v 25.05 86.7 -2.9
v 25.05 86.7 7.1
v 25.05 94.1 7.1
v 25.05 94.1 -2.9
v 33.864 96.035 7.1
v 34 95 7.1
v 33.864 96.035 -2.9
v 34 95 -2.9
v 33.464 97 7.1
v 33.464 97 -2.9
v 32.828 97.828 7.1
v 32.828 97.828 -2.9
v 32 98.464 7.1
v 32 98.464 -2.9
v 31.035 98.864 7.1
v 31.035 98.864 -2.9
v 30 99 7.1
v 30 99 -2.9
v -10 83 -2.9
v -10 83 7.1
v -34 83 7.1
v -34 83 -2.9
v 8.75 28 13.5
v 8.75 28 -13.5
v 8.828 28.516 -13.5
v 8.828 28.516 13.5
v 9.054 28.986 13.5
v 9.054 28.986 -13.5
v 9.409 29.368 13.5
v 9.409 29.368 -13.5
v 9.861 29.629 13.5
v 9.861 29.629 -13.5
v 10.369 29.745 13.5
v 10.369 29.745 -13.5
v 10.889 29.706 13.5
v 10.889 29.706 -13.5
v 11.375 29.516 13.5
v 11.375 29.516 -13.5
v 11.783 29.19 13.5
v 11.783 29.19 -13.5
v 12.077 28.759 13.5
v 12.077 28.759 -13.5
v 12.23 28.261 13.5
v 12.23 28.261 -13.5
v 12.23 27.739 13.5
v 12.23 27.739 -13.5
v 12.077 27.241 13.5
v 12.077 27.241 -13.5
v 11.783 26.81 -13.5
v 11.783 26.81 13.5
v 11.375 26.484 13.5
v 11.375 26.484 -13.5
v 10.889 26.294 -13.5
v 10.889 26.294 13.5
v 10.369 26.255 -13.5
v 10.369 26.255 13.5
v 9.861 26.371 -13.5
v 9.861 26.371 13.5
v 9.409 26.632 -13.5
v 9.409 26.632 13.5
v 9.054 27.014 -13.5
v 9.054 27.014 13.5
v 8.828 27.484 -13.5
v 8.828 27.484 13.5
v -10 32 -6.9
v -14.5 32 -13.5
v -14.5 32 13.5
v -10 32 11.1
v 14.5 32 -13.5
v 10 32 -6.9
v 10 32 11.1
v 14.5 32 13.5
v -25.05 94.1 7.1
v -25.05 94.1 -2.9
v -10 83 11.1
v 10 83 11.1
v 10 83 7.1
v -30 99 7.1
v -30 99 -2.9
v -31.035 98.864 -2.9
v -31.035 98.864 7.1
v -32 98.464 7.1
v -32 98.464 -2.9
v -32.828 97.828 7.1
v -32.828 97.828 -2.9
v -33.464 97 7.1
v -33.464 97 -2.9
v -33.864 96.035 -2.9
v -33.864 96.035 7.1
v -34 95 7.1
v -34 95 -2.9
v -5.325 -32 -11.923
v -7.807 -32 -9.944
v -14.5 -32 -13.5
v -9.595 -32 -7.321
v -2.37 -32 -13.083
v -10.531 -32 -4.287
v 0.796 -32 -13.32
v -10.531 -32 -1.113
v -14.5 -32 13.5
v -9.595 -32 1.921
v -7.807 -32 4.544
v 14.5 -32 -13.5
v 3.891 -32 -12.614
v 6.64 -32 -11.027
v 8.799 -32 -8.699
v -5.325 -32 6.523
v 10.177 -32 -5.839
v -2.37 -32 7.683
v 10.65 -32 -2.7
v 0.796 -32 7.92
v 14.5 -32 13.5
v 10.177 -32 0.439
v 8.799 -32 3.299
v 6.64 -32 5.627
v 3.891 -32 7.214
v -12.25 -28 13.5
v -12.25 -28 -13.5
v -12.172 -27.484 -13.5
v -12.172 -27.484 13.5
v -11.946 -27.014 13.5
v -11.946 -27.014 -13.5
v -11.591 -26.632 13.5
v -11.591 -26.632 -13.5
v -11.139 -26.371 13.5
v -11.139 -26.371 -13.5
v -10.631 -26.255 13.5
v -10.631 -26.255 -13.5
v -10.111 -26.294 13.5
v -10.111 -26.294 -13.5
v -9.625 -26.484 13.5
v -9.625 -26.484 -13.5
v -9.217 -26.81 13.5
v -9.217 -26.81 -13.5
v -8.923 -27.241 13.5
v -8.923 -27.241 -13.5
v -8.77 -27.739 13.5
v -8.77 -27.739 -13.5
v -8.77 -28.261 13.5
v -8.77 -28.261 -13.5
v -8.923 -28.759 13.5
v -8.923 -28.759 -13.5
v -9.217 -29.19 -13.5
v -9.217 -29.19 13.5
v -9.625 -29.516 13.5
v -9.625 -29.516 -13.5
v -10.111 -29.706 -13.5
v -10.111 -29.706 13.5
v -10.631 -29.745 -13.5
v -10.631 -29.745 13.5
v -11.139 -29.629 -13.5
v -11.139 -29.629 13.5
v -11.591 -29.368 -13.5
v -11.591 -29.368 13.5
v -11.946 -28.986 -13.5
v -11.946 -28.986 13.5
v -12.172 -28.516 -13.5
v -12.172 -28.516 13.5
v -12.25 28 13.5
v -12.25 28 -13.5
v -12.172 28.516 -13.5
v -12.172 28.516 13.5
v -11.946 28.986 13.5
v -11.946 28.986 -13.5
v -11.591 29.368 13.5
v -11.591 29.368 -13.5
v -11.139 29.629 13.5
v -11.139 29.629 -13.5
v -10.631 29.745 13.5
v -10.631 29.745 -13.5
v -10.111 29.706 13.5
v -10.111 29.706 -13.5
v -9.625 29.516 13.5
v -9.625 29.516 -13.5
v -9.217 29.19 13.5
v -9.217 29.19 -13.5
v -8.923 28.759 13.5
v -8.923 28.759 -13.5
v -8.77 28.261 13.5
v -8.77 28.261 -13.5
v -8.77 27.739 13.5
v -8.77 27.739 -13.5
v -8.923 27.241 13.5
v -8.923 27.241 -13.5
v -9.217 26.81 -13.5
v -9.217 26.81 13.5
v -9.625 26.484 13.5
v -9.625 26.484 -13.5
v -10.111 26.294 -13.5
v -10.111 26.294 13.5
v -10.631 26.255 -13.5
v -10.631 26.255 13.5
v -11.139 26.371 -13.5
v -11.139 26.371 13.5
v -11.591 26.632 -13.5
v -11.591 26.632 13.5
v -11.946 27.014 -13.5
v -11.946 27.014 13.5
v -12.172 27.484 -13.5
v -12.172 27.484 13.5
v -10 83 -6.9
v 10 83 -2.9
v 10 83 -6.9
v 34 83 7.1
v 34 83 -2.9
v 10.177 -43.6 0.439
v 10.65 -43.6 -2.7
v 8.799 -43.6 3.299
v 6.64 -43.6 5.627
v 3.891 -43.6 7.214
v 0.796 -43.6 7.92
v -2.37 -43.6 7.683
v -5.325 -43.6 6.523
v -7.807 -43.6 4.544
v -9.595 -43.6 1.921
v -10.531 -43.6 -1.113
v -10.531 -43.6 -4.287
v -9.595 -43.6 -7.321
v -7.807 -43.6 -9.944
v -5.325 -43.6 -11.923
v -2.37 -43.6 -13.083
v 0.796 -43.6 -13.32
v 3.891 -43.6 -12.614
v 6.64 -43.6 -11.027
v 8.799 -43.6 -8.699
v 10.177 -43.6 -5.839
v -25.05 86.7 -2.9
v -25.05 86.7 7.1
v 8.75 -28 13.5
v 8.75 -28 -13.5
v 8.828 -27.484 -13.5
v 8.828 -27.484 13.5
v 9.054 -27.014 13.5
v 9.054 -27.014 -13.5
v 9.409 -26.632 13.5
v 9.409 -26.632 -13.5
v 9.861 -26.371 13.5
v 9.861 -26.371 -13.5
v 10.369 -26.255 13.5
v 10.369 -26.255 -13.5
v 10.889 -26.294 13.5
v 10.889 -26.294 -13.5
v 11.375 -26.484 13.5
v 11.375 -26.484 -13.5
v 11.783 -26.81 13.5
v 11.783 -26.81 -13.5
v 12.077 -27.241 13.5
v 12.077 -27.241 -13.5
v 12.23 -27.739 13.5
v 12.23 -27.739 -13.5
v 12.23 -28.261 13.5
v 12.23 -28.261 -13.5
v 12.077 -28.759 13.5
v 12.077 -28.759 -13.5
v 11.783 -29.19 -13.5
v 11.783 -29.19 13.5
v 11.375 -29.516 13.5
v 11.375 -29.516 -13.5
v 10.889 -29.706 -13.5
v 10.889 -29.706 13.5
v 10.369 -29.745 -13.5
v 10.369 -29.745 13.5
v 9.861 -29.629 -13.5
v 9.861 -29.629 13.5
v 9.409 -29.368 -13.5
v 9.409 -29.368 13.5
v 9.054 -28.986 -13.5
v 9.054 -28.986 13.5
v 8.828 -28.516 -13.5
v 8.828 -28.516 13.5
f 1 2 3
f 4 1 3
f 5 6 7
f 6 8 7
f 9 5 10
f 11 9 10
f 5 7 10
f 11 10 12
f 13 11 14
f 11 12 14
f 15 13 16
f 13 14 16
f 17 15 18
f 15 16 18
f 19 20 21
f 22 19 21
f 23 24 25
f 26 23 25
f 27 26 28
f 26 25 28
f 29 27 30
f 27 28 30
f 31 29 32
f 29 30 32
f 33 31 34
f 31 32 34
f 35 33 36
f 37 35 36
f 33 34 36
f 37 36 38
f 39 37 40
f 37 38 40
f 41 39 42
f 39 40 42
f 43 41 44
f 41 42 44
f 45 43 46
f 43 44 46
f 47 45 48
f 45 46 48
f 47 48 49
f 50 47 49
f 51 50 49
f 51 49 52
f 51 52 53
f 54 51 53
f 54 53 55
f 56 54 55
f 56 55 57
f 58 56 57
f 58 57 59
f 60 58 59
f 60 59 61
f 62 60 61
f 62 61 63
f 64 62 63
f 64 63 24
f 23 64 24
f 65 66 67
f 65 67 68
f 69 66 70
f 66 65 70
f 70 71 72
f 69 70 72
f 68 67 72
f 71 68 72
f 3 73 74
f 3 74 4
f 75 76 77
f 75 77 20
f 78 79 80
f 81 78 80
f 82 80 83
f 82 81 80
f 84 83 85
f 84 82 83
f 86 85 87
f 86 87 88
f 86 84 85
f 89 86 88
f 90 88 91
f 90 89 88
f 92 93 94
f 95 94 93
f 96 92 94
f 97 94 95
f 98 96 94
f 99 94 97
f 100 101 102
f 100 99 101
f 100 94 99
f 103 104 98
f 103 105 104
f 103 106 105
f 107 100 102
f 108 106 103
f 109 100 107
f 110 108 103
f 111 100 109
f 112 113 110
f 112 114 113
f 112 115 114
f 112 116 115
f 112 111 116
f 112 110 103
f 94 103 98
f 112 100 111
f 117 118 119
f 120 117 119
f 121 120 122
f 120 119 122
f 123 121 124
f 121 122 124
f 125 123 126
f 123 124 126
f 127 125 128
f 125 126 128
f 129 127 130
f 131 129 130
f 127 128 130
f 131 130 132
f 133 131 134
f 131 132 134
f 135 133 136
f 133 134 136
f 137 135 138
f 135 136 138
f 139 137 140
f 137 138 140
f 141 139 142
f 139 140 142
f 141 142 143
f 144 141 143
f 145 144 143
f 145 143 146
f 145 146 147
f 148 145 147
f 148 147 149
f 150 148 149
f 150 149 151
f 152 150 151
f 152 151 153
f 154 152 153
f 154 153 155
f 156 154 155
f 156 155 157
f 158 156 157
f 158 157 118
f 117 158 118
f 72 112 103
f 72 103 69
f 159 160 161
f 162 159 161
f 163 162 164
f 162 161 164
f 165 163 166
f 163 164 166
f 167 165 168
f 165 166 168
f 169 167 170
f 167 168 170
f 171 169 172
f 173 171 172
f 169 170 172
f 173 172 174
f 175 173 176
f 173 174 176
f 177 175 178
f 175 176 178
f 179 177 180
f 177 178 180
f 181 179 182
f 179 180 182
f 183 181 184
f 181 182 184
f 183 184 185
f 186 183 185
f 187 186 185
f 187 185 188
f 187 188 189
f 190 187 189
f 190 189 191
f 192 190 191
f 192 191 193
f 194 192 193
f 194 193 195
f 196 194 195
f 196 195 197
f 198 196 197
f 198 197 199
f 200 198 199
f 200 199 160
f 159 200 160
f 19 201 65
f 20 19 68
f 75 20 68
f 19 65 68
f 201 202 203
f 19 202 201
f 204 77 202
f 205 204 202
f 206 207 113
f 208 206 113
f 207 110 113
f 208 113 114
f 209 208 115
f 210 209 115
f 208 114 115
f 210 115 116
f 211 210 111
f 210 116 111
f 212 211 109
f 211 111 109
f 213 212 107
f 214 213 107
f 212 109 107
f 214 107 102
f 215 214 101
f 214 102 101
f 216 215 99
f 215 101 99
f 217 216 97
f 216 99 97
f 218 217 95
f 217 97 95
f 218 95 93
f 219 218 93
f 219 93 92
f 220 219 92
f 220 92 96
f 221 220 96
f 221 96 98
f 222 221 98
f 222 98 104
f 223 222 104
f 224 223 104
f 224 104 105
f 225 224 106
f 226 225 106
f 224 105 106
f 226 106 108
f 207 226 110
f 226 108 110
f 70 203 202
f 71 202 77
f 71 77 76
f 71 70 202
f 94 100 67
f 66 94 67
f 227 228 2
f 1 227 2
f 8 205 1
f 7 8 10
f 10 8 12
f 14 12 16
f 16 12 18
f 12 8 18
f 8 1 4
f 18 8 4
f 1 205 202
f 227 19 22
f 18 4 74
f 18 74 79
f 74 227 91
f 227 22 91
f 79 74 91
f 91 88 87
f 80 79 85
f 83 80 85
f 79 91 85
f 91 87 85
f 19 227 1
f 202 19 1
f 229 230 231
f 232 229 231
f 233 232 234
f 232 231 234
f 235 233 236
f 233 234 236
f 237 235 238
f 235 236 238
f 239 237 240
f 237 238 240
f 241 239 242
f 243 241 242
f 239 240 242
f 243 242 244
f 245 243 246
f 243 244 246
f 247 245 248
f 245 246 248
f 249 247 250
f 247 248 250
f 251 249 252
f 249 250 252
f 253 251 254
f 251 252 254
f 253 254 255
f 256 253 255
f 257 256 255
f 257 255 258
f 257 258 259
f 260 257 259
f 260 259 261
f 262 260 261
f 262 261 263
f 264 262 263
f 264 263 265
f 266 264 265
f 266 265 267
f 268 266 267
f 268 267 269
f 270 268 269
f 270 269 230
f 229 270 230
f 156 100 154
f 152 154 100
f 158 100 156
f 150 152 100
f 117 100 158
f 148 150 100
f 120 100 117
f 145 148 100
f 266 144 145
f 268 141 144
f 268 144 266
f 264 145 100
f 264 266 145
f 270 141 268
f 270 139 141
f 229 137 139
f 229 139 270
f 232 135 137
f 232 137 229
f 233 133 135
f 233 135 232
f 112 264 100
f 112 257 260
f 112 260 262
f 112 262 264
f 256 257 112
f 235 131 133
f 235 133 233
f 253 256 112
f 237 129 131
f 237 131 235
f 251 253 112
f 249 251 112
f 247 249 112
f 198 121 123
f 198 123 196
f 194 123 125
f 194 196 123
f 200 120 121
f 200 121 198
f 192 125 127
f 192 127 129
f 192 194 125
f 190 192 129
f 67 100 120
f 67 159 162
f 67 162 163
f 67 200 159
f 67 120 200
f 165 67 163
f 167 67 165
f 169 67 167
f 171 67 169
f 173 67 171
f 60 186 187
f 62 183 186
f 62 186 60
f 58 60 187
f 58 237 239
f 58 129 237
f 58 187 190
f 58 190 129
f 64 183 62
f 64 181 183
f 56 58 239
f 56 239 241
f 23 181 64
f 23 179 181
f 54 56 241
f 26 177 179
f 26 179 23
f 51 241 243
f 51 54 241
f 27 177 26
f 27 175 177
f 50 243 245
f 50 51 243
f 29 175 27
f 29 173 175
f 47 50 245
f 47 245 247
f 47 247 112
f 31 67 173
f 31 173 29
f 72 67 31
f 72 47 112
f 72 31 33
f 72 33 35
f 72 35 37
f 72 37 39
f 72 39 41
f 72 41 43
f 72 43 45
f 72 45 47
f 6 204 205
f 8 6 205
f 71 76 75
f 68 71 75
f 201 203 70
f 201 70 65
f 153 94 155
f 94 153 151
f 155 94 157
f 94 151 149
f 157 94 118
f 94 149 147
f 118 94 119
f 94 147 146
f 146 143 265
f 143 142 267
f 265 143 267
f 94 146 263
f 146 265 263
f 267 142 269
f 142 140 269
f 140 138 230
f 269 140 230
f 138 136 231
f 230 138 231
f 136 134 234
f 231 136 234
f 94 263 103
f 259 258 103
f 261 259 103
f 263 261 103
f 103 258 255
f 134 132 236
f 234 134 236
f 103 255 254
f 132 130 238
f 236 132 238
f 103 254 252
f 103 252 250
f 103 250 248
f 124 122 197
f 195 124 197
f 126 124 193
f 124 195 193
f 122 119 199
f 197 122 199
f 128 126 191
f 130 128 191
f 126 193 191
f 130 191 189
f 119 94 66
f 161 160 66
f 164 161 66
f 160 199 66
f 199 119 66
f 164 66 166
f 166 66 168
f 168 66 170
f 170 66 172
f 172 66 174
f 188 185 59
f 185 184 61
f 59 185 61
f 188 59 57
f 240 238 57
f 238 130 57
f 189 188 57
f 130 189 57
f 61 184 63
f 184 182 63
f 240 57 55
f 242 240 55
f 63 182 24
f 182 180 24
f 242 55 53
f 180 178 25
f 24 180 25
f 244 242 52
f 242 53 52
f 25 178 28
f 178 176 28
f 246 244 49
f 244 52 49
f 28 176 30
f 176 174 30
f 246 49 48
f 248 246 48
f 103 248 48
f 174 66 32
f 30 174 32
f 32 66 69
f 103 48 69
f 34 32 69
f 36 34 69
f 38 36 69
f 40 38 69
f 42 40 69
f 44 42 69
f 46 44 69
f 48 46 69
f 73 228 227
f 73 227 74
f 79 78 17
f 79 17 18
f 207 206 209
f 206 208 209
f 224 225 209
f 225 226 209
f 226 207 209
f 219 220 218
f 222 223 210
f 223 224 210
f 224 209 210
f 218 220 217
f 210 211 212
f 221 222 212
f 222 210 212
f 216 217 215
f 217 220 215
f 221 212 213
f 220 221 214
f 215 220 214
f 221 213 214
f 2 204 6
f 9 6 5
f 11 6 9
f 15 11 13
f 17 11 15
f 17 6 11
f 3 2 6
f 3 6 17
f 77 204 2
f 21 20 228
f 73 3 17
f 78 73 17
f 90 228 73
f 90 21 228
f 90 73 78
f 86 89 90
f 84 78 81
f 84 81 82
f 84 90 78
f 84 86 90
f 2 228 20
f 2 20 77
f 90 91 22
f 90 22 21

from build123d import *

# Parameters (mm, degrees)
SKETCH_1_W                  = 29
SKETCH_1_H                  = 64
EXTRUDE_1_DEPTH             = 27
SKETCH_2_W                  = 20
SKETCH_2_H                  = 18
EXTRUDE_2_DEPTH             = 51
SKETCH_3_W                  = 44
SKETCH_3_H                  = 10
EXTRUDE_3_DEPTH             = 16
SKETCH_4_W                  = 10
SKETCH_4_H                  = 16
EXTRUDE_4_DEPTH             = 24
SKETCH_5_W                  = 50.1
SKETCH_5_H                  = 7.4
CUT_EXTRUDE_1_DEPTH         = 21.6
SKETCH_6_W                  = 10.65
SKETCH_6_H                  = 11.6
HOLE_WIZARD_3_5_3_5_1_D     = 3.5
HOLE_WIZARD_3_5_3_5_1_DEPTH = 27
FILLET_1_R                  = 4


with BuildPart() as part:
    # 草图1 → 凸台-拉伸1 (new body)
    with BuildSketch(Plane.XY.offset(13.5)):
        Rectangle(SKETCH_1_W, SKETCH_1_H)
    extrude(amount=-EXTRUDE_1_DEPTH)

    # 草图2 → 凸台-拉伸2 (add)
    with BuildSketch(Plane(origin=(0, 32, 0), x_dir=(-1, 0, 0), z_dir=(0, 1, 0))):
        with Locations((0, 2.1)):
            Rectangle(SKETCH_2_W, SKETCH_2_H)
    extrude(amount=EXTRUDE_2_DEPTH)

    # 草图3 → 凸台-拉伸3 (add)
    with BuildSketch(Plane(origin=(0, 83, 0), x_dir=(-1, 0, 0), z_dir=(0, 1, 0))):
        with Locations((12, 2.1)):
            Rectangle(SKETCH_3_W, SKETCH_3_H)
    extrude(amount=EXTRUDE_3_DEPTH)

    # 草图4 → 凸台-拉伸4 (add)
    with BuildSketch(Plane(origin=(10, 0, 0), x_dir=(0, 0, -1), z_dir=(1, 0, 0))):
        with Locations((-2.1, 91)):
            Rectangle(SKETCH_4_W, SKETCH_4_H)
    extrude(amount=EXTRUDE_4_DEPTH)

    # 草图5 → 切除-拉伸1 (cut, through all)
    with BuildSketch(Plane.XY.offset(7.1)):
        with Locations((0, 90.4)):
            Rectangle(SKETCH_5_W, SKETCH_5_H)
    extrude(amount=-CUT_EXTRUDE_1_DEPTH, mode=Mode.SUBTRACT)

    # 草图6 → 旋转1 (revolve)
    with BuildSketch(Plane.XY.offset(-2.7)):
        with Locations((5.325, -37.8)):
            Rectangle(SKETCH_6_W, SKETCH_6_H)
    revolve(axis=Axis((0, -32, -2.7), (0, -1, 0)))

    # Ø3.5 (3.5) 直径孔1
    with Locations(Plane.XY.offset(13.5)):
        with Locations((-10.5, -28), (10.5, -28), (-10.5, 28), (10.5, 28)):
            Hole(HOLE_WIZARD_3_5_3_5_1_D / 2, depth=HOLE_WIZARD_3_5_3_5_1_DEPTH)

    # 圆角1
    fillet_1_edges = [part.edges().sort_by_distance(p)[0] for p in [
        (-34, 99, 2.1),
        (34, 99, 2.1),
    ]]
    fillet(fillet_1_edges, radius=FILLET_1_R)


solid = part.part
